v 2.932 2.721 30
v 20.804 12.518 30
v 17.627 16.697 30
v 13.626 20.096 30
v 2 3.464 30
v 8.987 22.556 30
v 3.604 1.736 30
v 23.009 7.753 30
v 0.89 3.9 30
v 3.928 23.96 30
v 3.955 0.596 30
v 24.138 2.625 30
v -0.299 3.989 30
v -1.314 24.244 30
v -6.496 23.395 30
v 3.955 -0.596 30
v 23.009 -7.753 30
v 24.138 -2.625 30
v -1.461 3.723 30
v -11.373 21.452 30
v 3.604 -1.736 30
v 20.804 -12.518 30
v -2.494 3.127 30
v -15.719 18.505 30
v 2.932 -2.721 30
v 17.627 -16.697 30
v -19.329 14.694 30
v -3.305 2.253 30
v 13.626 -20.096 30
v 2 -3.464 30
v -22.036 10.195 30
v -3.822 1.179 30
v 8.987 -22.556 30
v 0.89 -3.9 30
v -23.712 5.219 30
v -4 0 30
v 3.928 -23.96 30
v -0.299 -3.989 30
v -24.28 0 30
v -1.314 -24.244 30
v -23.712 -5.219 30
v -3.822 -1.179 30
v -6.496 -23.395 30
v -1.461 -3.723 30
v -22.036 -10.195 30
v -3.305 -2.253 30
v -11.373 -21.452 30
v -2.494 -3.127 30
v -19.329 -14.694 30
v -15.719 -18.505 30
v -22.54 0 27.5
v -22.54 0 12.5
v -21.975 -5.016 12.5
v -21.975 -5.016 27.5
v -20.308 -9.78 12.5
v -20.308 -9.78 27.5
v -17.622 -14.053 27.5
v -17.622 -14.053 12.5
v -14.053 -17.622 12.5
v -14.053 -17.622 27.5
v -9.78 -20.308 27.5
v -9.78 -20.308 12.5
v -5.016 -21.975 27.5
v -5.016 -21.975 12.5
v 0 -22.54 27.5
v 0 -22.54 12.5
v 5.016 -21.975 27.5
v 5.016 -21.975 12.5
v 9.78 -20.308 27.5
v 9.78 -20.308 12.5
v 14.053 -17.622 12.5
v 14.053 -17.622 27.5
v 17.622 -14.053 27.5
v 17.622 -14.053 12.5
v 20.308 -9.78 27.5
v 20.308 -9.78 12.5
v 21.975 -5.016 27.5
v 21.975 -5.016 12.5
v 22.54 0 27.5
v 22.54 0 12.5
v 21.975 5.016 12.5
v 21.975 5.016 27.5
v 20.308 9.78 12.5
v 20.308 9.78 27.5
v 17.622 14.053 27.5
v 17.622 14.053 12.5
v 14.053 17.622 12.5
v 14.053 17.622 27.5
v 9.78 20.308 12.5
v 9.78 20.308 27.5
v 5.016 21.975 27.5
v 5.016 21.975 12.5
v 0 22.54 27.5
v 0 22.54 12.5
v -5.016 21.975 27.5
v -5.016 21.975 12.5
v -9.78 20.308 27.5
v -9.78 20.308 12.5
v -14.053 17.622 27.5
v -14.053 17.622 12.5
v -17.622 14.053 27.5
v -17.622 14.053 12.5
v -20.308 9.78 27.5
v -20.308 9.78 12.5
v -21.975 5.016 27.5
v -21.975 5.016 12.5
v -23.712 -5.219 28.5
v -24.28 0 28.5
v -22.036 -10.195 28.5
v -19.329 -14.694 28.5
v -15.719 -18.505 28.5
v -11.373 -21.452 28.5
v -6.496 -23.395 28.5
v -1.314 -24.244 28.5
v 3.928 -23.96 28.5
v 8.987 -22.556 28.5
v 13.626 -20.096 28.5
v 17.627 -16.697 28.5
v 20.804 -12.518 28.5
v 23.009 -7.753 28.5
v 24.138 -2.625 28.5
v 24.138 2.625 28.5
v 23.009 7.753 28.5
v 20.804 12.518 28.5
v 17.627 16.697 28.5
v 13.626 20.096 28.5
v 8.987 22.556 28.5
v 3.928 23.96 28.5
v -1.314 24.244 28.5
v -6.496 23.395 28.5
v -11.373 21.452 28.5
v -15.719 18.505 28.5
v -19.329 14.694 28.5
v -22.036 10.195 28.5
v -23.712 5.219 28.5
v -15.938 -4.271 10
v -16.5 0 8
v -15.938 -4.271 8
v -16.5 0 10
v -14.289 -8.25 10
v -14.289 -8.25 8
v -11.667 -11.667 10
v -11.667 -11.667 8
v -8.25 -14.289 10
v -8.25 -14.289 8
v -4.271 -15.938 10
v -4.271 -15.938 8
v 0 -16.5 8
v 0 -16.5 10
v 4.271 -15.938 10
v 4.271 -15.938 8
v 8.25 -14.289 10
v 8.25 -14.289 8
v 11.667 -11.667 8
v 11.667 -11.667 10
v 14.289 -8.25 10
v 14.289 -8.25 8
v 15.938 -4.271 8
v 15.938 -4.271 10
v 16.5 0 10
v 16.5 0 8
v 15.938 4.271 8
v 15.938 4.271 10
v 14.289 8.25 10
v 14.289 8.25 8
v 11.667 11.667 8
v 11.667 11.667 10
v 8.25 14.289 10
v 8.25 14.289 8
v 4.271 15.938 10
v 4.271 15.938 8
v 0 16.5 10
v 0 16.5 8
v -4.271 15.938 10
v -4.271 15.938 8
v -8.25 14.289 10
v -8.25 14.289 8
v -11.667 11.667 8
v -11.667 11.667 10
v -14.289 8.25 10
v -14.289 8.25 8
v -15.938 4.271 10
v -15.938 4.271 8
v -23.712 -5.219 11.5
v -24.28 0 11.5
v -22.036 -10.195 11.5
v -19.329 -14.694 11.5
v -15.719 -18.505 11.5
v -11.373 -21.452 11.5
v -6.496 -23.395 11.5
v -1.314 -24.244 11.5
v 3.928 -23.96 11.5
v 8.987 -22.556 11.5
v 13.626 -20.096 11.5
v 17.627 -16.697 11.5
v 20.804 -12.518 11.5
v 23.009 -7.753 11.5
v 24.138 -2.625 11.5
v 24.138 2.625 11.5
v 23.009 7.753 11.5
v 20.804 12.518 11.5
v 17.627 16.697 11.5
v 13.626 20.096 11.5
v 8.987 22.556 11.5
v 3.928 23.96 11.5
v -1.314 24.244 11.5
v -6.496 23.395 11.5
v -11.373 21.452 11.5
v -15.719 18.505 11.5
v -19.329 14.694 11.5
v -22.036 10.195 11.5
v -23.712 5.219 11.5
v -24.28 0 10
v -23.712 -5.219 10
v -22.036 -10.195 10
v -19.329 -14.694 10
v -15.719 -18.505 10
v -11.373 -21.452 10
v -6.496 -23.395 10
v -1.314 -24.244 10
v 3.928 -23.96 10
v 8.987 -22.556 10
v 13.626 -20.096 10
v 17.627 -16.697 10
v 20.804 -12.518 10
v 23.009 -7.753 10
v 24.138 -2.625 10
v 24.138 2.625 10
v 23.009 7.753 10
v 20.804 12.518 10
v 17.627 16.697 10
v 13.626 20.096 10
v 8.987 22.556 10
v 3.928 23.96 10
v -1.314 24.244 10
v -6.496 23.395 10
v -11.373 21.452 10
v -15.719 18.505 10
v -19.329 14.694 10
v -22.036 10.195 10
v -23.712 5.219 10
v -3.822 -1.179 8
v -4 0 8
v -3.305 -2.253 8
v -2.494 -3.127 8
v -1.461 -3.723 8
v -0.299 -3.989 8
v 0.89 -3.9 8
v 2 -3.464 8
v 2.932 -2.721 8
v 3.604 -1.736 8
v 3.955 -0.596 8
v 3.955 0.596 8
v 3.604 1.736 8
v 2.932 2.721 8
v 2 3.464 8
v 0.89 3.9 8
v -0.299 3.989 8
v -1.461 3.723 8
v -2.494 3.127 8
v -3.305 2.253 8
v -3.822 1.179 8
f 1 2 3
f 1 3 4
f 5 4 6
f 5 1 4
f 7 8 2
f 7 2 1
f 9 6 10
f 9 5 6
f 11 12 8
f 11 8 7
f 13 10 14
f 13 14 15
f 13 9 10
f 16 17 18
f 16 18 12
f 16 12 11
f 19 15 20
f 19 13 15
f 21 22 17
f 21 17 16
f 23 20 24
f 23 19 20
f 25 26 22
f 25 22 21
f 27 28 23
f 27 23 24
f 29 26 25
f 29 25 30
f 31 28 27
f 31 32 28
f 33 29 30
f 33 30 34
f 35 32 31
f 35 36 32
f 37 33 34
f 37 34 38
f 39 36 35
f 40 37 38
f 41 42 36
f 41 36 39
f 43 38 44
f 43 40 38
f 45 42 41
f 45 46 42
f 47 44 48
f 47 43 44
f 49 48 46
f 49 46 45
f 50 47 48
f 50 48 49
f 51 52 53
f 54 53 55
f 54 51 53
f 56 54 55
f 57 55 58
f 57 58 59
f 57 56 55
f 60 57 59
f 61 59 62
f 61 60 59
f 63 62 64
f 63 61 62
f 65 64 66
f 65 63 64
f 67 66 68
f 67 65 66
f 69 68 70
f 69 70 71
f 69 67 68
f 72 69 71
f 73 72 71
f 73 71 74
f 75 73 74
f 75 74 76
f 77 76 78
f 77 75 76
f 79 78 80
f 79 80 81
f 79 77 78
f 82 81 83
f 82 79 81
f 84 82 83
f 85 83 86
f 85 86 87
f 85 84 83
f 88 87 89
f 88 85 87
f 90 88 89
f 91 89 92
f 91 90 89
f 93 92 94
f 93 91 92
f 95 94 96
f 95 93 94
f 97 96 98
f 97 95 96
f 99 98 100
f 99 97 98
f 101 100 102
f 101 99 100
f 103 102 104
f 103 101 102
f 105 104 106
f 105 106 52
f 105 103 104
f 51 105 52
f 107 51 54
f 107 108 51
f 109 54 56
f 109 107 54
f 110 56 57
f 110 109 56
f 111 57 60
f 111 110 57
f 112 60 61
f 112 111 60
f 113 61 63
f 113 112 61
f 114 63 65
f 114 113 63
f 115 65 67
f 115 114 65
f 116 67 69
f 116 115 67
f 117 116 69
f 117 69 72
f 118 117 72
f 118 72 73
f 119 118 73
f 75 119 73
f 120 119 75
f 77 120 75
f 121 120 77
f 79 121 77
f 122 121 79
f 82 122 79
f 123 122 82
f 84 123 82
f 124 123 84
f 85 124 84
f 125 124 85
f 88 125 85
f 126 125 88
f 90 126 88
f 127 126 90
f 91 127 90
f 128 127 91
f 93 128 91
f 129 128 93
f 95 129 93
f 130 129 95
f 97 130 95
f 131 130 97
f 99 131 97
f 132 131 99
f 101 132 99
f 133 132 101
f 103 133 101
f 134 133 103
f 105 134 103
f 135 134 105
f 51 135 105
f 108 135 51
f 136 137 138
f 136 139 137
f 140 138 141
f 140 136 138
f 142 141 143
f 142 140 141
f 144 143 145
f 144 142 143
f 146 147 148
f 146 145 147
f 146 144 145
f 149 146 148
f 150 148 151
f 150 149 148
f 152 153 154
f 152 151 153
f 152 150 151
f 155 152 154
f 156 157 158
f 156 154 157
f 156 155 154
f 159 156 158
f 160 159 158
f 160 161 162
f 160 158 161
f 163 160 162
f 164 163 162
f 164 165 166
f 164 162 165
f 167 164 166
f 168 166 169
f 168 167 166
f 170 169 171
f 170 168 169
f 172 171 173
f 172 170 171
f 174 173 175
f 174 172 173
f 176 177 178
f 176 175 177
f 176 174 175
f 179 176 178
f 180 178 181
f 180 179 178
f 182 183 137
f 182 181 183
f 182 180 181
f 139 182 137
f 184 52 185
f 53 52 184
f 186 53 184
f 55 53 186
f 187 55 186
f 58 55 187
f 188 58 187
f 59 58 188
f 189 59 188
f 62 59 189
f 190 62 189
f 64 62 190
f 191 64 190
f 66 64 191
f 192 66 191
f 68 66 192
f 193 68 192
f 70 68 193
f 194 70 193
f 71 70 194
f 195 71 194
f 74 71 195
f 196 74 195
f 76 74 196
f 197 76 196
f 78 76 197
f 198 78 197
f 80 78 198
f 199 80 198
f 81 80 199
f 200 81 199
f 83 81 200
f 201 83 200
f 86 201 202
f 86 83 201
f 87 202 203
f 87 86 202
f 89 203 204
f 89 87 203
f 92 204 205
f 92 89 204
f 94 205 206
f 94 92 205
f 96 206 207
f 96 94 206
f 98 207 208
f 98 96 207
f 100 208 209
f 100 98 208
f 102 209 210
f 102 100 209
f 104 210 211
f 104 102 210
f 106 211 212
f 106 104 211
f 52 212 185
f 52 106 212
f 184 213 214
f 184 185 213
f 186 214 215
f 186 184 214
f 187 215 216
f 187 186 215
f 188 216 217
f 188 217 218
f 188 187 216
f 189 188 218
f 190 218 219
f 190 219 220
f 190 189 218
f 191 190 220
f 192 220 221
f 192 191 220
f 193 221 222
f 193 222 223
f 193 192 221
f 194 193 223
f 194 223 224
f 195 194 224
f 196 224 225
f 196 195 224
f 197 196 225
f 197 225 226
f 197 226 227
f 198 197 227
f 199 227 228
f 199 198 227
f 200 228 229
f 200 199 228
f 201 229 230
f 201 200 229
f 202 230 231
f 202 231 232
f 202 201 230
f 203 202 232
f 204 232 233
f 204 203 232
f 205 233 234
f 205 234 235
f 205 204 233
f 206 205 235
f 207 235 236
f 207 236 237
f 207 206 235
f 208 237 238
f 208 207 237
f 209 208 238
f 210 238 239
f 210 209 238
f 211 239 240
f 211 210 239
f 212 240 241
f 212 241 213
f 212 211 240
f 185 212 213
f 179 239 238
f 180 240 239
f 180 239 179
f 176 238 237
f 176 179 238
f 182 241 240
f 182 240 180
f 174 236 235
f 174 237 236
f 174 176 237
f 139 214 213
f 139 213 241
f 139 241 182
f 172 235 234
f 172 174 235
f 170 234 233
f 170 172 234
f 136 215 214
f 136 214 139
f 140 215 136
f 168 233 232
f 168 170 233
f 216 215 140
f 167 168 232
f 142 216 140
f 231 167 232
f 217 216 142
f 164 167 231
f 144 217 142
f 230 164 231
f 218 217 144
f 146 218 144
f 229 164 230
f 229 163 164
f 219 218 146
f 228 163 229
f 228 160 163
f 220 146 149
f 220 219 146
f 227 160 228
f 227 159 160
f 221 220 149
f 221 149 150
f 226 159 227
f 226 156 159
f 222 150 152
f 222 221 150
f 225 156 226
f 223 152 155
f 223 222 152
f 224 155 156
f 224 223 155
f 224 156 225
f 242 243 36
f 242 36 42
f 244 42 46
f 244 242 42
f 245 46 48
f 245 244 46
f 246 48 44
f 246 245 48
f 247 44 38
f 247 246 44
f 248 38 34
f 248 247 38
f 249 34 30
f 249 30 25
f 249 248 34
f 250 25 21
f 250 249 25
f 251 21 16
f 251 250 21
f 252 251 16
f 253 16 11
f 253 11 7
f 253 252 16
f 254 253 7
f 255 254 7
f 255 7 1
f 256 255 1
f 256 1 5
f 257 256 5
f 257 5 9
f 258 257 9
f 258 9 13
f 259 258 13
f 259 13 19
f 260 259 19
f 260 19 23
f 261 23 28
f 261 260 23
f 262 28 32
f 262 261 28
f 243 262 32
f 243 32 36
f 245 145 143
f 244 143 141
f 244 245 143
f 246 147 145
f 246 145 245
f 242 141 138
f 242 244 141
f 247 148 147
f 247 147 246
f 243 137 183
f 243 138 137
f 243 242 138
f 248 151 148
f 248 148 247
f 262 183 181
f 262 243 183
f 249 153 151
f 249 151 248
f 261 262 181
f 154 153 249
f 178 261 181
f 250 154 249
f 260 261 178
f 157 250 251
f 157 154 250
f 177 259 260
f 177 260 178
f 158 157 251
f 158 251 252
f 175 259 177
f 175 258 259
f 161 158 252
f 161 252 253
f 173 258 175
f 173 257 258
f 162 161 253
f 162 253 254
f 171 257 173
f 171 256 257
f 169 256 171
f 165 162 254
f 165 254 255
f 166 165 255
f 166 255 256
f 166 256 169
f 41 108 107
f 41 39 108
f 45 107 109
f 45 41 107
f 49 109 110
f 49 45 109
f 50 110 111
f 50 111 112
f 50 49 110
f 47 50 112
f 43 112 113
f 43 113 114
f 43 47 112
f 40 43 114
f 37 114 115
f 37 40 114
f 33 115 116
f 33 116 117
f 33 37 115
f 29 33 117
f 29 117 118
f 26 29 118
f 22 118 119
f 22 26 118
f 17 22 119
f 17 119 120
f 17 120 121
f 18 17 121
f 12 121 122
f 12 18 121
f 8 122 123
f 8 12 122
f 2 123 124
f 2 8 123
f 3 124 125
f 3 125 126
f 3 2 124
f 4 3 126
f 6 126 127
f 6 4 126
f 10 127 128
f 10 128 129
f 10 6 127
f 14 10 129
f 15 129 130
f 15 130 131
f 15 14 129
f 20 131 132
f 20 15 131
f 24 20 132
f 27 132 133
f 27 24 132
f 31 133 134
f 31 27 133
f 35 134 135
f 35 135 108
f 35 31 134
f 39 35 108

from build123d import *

# Parameters (mm, degrees)
SKICA2_W                 = 8
SKICA2_H                 = 33
ODEBRAT_VYSUNUT_M1_DEPTH = 35


with BuildPart() as part:
    # Skica1 → Rotovat1 (revolve)
    with BuildSketch(Plane(origin=(0, 0, 0), x_dir=(0, 0, -1), z_dir=(1, 0, 0)), mode=Mode.PRIVATE) as rotovat1_sk:
        Polygon((0, 4), (0, 16.5), (-10, 16.5), (-10, 24.28), (-11.5, 24.28), (-12.5, 22.54), (-27.5, 22.54), (-28.5, 24.28), (-30, 24.28), (-30, 4), align=None)
    revolve(rotovat1_sk.sketch.rotate(Axis((0, 0, 0), (0, 0, 1)), 90), axis=Axis((0, 0, 0), (0, 0, 1)))

    # Skica2 → Odebrat vysunutím1 (cut, symmetric)
    with BuildSketch(Plane(origin=(0, 0, 0), x_dir=(0, 0, -1), z_dir=(1, 0, 0))):
        with Locations((-4, 0)):
            Rectangle(SKICA2_W, SKICA2_H)
    extrude(amount=ODEBRAT_VYSUNUT_M1_DEPTH, both=True, mode=Mode.SUBTRACT)


solid = part.part
